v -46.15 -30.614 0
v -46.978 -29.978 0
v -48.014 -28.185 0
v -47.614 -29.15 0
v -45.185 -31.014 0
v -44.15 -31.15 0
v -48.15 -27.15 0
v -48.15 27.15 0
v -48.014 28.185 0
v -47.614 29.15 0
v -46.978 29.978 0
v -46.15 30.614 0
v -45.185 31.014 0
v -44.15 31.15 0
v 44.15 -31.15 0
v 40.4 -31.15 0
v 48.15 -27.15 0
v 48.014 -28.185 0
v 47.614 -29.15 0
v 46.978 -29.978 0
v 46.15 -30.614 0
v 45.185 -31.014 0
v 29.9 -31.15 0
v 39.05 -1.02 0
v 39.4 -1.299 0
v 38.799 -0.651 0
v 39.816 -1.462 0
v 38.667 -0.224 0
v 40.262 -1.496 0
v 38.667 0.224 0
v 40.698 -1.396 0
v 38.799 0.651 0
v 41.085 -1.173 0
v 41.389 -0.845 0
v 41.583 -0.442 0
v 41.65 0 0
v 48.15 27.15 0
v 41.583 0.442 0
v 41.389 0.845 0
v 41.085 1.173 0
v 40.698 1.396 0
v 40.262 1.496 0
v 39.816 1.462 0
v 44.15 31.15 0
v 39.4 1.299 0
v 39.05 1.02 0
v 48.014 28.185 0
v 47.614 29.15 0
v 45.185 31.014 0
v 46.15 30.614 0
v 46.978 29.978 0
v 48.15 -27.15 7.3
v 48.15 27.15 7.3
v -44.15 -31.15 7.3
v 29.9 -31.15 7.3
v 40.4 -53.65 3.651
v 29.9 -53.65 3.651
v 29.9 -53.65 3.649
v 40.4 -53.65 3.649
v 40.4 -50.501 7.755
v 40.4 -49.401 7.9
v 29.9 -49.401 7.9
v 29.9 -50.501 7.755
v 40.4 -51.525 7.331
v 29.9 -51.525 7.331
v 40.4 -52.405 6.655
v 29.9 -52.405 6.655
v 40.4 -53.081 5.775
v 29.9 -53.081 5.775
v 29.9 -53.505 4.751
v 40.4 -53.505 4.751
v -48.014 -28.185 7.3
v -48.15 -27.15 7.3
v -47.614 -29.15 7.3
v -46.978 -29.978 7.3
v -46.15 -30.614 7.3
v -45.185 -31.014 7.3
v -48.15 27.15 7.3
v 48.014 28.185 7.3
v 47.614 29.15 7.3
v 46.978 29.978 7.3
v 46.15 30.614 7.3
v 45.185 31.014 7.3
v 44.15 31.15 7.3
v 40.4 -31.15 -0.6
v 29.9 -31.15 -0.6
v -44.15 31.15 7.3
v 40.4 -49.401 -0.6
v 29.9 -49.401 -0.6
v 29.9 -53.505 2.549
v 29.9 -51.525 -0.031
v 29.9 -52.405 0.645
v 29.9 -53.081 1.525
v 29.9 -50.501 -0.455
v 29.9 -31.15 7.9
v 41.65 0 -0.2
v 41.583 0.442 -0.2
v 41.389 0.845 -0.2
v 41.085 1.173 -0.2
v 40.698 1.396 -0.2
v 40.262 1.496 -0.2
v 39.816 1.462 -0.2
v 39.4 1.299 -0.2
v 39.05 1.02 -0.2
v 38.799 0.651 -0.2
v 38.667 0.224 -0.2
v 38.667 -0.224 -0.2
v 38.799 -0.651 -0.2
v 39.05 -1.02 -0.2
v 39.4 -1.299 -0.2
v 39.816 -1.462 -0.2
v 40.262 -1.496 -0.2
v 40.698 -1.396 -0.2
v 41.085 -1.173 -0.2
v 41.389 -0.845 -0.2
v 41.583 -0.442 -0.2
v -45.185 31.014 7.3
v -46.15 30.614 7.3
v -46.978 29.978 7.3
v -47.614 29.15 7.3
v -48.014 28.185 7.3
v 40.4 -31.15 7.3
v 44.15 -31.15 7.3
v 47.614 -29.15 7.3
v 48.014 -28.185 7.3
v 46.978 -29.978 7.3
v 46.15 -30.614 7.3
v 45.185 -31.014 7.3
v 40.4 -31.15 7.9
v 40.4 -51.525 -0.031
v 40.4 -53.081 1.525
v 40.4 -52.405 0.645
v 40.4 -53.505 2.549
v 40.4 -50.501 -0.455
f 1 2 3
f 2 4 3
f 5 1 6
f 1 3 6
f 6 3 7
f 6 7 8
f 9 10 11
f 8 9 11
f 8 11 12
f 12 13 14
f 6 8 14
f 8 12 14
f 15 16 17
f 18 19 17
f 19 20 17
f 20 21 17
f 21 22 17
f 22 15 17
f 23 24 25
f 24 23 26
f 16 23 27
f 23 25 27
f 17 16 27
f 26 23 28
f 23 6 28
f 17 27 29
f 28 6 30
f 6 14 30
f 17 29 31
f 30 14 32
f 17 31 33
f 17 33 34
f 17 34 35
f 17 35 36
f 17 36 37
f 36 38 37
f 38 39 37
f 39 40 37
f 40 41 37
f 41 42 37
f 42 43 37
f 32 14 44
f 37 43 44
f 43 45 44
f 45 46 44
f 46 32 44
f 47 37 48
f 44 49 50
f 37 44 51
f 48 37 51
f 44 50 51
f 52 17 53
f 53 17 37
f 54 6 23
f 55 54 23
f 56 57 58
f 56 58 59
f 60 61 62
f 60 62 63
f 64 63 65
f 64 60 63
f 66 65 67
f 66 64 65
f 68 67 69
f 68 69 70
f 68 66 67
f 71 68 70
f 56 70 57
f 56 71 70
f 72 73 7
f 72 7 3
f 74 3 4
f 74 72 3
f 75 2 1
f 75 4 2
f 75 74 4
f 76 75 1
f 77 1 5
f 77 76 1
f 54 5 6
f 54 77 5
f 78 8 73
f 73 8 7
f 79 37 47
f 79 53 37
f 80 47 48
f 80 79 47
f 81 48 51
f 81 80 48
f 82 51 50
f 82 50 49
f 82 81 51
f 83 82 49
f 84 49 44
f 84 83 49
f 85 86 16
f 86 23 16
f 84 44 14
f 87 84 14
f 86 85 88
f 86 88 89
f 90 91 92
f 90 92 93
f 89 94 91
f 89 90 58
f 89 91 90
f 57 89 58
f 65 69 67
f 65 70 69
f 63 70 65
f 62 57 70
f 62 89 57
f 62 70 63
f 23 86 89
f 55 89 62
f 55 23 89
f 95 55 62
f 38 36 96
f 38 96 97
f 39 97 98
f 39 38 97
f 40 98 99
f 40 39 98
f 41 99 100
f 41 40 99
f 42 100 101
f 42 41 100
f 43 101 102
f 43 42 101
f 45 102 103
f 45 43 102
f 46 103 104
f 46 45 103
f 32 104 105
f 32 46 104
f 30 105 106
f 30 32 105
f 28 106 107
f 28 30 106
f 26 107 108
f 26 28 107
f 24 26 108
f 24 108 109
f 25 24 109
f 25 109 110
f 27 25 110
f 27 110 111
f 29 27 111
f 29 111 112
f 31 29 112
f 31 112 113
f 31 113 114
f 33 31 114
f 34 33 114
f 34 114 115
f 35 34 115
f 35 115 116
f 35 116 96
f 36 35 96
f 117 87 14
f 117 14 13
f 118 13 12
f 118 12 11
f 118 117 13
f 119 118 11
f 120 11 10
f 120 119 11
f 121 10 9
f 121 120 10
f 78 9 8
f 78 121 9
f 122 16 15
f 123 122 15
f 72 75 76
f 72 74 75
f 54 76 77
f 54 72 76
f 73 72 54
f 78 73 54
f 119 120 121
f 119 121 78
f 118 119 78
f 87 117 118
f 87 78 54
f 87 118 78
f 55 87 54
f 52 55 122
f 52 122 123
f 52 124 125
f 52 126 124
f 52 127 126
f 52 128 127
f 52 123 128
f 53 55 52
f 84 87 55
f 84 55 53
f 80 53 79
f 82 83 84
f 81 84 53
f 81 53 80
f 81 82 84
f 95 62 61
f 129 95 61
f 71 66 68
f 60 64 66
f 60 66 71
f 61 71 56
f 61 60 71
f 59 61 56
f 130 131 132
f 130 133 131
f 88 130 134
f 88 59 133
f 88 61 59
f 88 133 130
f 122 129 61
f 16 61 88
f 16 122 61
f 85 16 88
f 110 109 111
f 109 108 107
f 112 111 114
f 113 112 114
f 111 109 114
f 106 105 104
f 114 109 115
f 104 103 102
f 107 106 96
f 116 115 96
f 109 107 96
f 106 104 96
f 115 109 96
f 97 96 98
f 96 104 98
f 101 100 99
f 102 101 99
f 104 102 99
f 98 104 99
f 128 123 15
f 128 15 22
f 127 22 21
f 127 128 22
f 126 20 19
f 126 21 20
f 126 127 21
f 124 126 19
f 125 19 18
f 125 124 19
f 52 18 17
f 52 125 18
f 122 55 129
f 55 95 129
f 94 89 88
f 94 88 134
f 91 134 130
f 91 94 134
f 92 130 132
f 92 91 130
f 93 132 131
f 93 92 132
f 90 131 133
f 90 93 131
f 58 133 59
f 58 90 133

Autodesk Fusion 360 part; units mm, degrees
sketch "Sketch1" plane through (0, 0, 0) normal (0, 0, 1) x (1, 0, 0)
  line L0 (48.15, 31.15) -> (-48.15, 31.15)
  line L1 (-48.15, 31.15) -> (-48.15, -31.15)
  line L2 (-48.15, -31.15) -> (48.15, -31.15)
  line L3 (48.15, -31.15) -> (48.15, 31.15)
  line L4 (48.15, 31.15) -> (-48.15, -31.15) construction
  line L5 (-48.15, 31.15) -> (48.15, -31.15) construction
  line L6 (0, 0) -> (48.15, 0) construction
  circle A0 centre (40.15, 0) radius 1.5
  dimension "d1" = 96.3
  dimension "d2" = 62.3
  dimension "d10" = 3
  dimension "d11" = 8
extrude "Extrude1" add sketch "Sketch1" along normal blind 7.3 contours L0 L1 L2 L3 | A0
fillet "Fillet1" radius 4 4 edges at (-48.15, -31.15, 3.65) (48.15, -31.15, 3.65) (48.15, 31.15, 3.65) (-48.15, 31.15, 3.65)
extrude "Extrude2" add sketch "Sketch1" against normal blind 0.2 contours A0
sketch "Sketch3" plane through (0, -31.15, 0) normal (0, -1, 0) x (1, 0, 0)
  line L0 (44.15, 0) -> (44.15, 7.3)
  line L1 (44.15, 7.3) -> (-44.15, 7.3)
  line L2 (-44.15, 7.3) -> (-44.15, 0)
  line L3 (-44.15, 0) -> (44.15, 0)
  line L4 (48.15, 0) -> (48.15, 7.3) construction
  line L5 (48.15, 3.65) -> (35.15, 3.65) construction
  line L6 (40.4, -0.6) -> (29.9, -0.6)
  line L7 (29.9, -0.6) -> (29.9, 7.9)
  line L8 (29.9, 7.9) -> (40.4, 7.9)
  line L9 (40.4, 7.9) -> (40.4, -0.6)
  line L10 (40.4, -0.6) -> (29.9, 7.9) construction
  line L11 (29.9, -0.6) -> (40.4, 7.9) construction
  point P0 (35.15, 3.65)
  dimension "d16" = 13
  dimension "d17" = 10.5
  dimension "d18" = 8.5
extrude "Extrude3" add sketch "Sketch3" along normal blind 22.5 contours L3 L6 L7 L9 | L1 L3 L7 L9 | L1 L7 L8 L9
fillet "Fillet2" radius 4.25 2 edges at (35.15, -53.65, -0.6) (35.15, -53.65, 7.9)
equation "d1 = powerBankLength"
equation "d2 = powerBankWidth"
equation "clearanceStationary = 0.125 mm"
equation "clearanceMoving = 2 * clearanceStationary"
equation "powerBankWidth = 62.3 mm"
equation "powerBankLength = 96.3 mm"
equation "powerBankHeight = 7.3 mm"
equation "d8 = powerBankHeight"
equation "d17 = usbPlugWidth"
equation "d18 = usbPlugHeight"
equation "usbPlugWidth = 10.5 mm"
equation "usbPlugHeight = 8.5 mm"
equation "usbPlugLength = 22.5 mm"
equation "d22 = usbPlugLength"
equation "d25 = usbPlugHeight / 2"
